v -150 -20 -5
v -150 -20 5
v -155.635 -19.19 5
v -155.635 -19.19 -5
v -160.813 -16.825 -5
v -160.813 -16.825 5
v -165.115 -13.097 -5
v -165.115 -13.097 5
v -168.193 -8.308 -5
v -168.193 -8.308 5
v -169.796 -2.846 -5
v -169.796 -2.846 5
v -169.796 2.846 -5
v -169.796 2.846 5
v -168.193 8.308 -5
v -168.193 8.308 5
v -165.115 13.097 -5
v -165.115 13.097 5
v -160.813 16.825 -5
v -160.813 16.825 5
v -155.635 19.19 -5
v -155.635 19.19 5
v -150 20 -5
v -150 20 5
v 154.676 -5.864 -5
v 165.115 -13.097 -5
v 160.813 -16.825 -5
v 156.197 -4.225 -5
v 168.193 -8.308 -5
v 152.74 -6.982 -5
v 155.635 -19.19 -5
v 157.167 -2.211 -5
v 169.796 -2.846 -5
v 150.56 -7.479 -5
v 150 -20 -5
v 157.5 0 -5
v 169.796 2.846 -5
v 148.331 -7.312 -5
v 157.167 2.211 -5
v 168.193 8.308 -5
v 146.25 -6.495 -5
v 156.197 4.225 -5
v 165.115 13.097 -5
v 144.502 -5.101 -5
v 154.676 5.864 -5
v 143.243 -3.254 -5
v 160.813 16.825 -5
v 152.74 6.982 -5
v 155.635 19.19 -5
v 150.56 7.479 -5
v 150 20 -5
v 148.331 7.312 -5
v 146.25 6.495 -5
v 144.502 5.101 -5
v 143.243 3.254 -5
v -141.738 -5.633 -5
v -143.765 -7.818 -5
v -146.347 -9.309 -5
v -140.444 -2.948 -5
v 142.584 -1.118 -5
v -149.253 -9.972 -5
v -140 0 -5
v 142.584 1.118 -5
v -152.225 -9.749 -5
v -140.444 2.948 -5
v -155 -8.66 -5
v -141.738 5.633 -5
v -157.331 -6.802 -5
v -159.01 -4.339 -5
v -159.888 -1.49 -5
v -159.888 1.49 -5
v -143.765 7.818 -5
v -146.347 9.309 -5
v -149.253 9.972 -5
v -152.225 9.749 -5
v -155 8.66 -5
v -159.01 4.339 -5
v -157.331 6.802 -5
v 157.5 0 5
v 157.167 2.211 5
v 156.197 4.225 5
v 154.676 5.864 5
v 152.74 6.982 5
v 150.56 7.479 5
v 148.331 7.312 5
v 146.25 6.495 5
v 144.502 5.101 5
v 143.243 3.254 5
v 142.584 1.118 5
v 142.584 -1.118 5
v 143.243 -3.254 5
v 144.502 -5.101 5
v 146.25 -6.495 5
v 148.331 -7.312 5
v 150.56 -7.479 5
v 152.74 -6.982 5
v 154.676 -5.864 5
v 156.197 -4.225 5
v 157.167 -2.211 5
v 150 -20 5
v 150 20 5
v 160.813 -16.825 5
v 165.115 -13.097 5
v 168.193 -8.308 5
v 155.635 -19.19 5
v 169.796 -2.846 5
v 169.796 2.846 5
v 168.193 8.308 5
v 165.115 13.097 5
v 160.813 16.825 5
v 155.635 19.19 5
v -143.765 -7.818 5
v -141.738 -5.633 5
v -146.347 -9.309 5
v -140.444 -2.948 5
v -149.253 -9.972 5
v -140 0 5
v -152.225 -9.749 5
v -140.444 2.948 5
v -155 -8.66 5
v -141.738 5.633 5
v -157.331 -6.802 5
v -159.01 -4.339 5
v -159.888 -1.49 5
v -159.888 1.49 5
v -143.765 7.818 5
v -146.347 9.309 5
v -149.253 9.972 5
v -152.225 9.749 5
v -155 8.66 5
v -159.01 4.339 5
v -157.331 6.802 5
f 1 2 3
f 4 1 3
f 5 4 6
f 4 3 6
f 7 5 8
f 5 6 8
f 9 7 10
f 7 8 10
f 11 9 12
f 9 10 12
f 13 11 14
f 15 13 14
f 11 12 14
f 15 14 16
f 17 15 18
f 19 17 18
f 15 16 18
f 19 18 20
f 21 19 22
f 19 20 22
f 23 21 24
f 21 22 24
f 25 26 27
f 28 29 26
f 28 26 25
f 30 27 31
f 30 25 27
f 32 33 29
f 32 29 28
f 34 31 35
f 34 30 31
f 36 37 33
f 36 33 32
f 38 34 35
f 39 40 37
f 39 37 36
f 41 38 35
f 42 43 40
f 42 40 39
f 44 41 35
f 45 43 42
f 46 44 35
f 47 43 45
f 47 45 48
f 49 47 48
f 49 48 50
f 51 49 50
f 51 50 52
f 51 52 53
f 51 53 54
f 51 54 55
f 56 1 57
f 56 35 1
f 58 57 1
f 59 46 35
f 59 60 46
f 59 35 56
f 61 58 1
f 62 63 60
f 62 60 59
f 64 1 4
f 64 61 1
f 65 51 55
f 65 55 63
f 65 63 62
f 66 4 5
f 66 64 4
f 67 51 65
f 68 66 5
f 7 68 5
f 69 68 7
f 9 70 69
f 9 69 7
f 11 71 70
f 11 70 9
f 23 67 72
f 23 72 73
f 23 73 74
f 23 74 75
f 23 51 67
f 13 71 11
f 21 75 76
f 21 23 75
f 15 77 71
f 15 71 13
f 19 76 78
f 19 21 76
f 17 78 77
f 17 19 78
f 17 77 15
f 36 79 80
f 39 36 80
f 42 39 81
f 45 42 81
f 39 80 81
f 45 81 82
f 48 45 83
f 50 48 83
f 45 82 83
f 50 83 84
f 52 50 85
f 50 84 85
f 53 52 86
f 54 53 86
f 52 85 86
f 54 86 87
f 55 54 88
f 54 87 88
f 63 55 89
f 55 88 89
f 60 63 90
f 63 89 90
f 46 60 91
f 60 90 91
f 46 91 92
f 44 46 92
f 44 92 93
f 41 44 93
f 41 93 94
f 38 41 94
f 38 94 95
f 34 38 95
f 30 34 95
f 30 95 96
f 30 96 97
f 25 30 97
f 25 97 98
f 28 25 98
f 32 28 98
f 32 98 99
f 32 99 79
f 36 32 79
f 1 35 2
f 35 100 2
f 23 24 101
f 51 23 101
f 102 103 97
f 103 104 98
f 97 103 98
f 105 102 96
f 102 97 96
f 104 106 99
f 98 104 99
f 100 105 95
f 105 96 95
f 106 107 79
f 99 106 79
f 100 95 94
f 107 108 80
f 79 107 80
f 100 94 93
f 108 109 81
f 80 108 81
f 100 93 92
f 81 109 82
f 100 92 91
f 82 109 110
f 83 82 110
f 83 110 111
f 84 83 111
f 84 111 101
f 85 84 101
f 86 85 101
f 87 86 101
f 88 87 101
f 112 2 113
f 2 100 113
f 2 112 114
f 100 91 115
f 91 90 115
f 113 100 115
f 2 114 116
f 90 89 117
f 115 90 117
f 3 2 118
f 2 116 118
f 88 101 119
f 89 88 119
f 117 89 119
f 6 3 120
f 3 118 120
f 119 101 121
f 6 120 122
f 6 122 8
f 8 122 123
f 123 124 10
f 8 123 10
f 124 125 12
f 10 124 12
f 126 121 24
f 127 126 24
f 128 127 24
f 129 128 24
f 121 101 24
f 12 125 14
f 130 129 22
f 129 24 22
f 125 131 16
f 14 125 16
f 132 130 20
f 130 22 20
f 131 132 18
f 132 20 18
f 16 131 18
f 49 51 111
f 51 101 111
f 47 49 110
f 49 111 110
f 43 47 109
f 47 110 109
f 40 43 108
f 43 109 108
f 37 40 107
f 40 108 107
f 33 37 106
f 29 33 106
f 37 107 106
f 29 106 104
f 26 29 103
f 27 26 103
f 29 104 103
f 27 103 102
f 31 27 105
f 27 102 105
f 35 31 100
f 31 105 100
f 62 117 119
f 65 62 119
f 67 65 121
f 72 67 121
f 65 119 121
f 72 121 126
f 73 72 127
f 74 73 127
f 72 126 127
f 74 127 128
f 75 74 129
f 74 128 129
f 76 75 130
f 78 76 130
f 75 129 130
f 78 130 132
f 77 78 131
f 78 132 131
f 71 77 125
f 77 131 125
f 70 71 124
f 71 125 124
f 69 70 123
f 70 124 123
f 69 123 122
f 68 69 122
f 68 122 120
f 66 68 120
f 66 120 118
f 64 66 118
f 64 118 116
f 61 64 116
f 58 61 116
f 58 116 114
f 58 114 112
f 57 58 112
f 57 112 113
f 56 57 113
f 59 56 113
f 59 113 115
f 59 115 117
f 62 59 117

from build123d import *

# Parameters (mm, degrees)
BOSS_EXTRUDE1_DEPTH     = 5
SKETCH2_R               = 10
SKETCH2_R_2             = 7.5
CUT_EXTRUDE1_DEPTH      = 1
CUT_EXTRUDE1_DEPTH_BACK = 11


with BuildPart() as part:
    # Sketch1 → Boss-Extrude1 (new body, symmetric)
    with BuildSketch(Plane.XY):
        with BuildLine():
            Line((-150, 20), (150, 20))
            ThreePointArc((150, 20), (170, 0), (150, -20))
            Line((150, -20), (-150, -20))
            ThreePointArc((-150, -20), (-170, 0), (-150, 20))
        make_face()
    extrude(amount=BOSS_EXTRUDE1_DEPTH, both=True)

    # Sketch2 → Cut-Extrude1 (cut, two sides)
    with BuildSketch(Plane.XY.offset(5)) as cut_extrude1_sk:
        with Locations((-150, 0)):
            Circle(SKETCH2_R)
        with Locations((150, 0)):
            Circle(SKETCH2_R_2)
    extrude(amount=CUT_EXTRUDE1_DEPTH, mode=Mode.SUBTRACT)
    extrude(cut_extrude1_sk.sketch, amount=-CUT_EXTRUDE1_DEPTH_BACK, mode=Mode.SUBTRACT)


solid = part.part
